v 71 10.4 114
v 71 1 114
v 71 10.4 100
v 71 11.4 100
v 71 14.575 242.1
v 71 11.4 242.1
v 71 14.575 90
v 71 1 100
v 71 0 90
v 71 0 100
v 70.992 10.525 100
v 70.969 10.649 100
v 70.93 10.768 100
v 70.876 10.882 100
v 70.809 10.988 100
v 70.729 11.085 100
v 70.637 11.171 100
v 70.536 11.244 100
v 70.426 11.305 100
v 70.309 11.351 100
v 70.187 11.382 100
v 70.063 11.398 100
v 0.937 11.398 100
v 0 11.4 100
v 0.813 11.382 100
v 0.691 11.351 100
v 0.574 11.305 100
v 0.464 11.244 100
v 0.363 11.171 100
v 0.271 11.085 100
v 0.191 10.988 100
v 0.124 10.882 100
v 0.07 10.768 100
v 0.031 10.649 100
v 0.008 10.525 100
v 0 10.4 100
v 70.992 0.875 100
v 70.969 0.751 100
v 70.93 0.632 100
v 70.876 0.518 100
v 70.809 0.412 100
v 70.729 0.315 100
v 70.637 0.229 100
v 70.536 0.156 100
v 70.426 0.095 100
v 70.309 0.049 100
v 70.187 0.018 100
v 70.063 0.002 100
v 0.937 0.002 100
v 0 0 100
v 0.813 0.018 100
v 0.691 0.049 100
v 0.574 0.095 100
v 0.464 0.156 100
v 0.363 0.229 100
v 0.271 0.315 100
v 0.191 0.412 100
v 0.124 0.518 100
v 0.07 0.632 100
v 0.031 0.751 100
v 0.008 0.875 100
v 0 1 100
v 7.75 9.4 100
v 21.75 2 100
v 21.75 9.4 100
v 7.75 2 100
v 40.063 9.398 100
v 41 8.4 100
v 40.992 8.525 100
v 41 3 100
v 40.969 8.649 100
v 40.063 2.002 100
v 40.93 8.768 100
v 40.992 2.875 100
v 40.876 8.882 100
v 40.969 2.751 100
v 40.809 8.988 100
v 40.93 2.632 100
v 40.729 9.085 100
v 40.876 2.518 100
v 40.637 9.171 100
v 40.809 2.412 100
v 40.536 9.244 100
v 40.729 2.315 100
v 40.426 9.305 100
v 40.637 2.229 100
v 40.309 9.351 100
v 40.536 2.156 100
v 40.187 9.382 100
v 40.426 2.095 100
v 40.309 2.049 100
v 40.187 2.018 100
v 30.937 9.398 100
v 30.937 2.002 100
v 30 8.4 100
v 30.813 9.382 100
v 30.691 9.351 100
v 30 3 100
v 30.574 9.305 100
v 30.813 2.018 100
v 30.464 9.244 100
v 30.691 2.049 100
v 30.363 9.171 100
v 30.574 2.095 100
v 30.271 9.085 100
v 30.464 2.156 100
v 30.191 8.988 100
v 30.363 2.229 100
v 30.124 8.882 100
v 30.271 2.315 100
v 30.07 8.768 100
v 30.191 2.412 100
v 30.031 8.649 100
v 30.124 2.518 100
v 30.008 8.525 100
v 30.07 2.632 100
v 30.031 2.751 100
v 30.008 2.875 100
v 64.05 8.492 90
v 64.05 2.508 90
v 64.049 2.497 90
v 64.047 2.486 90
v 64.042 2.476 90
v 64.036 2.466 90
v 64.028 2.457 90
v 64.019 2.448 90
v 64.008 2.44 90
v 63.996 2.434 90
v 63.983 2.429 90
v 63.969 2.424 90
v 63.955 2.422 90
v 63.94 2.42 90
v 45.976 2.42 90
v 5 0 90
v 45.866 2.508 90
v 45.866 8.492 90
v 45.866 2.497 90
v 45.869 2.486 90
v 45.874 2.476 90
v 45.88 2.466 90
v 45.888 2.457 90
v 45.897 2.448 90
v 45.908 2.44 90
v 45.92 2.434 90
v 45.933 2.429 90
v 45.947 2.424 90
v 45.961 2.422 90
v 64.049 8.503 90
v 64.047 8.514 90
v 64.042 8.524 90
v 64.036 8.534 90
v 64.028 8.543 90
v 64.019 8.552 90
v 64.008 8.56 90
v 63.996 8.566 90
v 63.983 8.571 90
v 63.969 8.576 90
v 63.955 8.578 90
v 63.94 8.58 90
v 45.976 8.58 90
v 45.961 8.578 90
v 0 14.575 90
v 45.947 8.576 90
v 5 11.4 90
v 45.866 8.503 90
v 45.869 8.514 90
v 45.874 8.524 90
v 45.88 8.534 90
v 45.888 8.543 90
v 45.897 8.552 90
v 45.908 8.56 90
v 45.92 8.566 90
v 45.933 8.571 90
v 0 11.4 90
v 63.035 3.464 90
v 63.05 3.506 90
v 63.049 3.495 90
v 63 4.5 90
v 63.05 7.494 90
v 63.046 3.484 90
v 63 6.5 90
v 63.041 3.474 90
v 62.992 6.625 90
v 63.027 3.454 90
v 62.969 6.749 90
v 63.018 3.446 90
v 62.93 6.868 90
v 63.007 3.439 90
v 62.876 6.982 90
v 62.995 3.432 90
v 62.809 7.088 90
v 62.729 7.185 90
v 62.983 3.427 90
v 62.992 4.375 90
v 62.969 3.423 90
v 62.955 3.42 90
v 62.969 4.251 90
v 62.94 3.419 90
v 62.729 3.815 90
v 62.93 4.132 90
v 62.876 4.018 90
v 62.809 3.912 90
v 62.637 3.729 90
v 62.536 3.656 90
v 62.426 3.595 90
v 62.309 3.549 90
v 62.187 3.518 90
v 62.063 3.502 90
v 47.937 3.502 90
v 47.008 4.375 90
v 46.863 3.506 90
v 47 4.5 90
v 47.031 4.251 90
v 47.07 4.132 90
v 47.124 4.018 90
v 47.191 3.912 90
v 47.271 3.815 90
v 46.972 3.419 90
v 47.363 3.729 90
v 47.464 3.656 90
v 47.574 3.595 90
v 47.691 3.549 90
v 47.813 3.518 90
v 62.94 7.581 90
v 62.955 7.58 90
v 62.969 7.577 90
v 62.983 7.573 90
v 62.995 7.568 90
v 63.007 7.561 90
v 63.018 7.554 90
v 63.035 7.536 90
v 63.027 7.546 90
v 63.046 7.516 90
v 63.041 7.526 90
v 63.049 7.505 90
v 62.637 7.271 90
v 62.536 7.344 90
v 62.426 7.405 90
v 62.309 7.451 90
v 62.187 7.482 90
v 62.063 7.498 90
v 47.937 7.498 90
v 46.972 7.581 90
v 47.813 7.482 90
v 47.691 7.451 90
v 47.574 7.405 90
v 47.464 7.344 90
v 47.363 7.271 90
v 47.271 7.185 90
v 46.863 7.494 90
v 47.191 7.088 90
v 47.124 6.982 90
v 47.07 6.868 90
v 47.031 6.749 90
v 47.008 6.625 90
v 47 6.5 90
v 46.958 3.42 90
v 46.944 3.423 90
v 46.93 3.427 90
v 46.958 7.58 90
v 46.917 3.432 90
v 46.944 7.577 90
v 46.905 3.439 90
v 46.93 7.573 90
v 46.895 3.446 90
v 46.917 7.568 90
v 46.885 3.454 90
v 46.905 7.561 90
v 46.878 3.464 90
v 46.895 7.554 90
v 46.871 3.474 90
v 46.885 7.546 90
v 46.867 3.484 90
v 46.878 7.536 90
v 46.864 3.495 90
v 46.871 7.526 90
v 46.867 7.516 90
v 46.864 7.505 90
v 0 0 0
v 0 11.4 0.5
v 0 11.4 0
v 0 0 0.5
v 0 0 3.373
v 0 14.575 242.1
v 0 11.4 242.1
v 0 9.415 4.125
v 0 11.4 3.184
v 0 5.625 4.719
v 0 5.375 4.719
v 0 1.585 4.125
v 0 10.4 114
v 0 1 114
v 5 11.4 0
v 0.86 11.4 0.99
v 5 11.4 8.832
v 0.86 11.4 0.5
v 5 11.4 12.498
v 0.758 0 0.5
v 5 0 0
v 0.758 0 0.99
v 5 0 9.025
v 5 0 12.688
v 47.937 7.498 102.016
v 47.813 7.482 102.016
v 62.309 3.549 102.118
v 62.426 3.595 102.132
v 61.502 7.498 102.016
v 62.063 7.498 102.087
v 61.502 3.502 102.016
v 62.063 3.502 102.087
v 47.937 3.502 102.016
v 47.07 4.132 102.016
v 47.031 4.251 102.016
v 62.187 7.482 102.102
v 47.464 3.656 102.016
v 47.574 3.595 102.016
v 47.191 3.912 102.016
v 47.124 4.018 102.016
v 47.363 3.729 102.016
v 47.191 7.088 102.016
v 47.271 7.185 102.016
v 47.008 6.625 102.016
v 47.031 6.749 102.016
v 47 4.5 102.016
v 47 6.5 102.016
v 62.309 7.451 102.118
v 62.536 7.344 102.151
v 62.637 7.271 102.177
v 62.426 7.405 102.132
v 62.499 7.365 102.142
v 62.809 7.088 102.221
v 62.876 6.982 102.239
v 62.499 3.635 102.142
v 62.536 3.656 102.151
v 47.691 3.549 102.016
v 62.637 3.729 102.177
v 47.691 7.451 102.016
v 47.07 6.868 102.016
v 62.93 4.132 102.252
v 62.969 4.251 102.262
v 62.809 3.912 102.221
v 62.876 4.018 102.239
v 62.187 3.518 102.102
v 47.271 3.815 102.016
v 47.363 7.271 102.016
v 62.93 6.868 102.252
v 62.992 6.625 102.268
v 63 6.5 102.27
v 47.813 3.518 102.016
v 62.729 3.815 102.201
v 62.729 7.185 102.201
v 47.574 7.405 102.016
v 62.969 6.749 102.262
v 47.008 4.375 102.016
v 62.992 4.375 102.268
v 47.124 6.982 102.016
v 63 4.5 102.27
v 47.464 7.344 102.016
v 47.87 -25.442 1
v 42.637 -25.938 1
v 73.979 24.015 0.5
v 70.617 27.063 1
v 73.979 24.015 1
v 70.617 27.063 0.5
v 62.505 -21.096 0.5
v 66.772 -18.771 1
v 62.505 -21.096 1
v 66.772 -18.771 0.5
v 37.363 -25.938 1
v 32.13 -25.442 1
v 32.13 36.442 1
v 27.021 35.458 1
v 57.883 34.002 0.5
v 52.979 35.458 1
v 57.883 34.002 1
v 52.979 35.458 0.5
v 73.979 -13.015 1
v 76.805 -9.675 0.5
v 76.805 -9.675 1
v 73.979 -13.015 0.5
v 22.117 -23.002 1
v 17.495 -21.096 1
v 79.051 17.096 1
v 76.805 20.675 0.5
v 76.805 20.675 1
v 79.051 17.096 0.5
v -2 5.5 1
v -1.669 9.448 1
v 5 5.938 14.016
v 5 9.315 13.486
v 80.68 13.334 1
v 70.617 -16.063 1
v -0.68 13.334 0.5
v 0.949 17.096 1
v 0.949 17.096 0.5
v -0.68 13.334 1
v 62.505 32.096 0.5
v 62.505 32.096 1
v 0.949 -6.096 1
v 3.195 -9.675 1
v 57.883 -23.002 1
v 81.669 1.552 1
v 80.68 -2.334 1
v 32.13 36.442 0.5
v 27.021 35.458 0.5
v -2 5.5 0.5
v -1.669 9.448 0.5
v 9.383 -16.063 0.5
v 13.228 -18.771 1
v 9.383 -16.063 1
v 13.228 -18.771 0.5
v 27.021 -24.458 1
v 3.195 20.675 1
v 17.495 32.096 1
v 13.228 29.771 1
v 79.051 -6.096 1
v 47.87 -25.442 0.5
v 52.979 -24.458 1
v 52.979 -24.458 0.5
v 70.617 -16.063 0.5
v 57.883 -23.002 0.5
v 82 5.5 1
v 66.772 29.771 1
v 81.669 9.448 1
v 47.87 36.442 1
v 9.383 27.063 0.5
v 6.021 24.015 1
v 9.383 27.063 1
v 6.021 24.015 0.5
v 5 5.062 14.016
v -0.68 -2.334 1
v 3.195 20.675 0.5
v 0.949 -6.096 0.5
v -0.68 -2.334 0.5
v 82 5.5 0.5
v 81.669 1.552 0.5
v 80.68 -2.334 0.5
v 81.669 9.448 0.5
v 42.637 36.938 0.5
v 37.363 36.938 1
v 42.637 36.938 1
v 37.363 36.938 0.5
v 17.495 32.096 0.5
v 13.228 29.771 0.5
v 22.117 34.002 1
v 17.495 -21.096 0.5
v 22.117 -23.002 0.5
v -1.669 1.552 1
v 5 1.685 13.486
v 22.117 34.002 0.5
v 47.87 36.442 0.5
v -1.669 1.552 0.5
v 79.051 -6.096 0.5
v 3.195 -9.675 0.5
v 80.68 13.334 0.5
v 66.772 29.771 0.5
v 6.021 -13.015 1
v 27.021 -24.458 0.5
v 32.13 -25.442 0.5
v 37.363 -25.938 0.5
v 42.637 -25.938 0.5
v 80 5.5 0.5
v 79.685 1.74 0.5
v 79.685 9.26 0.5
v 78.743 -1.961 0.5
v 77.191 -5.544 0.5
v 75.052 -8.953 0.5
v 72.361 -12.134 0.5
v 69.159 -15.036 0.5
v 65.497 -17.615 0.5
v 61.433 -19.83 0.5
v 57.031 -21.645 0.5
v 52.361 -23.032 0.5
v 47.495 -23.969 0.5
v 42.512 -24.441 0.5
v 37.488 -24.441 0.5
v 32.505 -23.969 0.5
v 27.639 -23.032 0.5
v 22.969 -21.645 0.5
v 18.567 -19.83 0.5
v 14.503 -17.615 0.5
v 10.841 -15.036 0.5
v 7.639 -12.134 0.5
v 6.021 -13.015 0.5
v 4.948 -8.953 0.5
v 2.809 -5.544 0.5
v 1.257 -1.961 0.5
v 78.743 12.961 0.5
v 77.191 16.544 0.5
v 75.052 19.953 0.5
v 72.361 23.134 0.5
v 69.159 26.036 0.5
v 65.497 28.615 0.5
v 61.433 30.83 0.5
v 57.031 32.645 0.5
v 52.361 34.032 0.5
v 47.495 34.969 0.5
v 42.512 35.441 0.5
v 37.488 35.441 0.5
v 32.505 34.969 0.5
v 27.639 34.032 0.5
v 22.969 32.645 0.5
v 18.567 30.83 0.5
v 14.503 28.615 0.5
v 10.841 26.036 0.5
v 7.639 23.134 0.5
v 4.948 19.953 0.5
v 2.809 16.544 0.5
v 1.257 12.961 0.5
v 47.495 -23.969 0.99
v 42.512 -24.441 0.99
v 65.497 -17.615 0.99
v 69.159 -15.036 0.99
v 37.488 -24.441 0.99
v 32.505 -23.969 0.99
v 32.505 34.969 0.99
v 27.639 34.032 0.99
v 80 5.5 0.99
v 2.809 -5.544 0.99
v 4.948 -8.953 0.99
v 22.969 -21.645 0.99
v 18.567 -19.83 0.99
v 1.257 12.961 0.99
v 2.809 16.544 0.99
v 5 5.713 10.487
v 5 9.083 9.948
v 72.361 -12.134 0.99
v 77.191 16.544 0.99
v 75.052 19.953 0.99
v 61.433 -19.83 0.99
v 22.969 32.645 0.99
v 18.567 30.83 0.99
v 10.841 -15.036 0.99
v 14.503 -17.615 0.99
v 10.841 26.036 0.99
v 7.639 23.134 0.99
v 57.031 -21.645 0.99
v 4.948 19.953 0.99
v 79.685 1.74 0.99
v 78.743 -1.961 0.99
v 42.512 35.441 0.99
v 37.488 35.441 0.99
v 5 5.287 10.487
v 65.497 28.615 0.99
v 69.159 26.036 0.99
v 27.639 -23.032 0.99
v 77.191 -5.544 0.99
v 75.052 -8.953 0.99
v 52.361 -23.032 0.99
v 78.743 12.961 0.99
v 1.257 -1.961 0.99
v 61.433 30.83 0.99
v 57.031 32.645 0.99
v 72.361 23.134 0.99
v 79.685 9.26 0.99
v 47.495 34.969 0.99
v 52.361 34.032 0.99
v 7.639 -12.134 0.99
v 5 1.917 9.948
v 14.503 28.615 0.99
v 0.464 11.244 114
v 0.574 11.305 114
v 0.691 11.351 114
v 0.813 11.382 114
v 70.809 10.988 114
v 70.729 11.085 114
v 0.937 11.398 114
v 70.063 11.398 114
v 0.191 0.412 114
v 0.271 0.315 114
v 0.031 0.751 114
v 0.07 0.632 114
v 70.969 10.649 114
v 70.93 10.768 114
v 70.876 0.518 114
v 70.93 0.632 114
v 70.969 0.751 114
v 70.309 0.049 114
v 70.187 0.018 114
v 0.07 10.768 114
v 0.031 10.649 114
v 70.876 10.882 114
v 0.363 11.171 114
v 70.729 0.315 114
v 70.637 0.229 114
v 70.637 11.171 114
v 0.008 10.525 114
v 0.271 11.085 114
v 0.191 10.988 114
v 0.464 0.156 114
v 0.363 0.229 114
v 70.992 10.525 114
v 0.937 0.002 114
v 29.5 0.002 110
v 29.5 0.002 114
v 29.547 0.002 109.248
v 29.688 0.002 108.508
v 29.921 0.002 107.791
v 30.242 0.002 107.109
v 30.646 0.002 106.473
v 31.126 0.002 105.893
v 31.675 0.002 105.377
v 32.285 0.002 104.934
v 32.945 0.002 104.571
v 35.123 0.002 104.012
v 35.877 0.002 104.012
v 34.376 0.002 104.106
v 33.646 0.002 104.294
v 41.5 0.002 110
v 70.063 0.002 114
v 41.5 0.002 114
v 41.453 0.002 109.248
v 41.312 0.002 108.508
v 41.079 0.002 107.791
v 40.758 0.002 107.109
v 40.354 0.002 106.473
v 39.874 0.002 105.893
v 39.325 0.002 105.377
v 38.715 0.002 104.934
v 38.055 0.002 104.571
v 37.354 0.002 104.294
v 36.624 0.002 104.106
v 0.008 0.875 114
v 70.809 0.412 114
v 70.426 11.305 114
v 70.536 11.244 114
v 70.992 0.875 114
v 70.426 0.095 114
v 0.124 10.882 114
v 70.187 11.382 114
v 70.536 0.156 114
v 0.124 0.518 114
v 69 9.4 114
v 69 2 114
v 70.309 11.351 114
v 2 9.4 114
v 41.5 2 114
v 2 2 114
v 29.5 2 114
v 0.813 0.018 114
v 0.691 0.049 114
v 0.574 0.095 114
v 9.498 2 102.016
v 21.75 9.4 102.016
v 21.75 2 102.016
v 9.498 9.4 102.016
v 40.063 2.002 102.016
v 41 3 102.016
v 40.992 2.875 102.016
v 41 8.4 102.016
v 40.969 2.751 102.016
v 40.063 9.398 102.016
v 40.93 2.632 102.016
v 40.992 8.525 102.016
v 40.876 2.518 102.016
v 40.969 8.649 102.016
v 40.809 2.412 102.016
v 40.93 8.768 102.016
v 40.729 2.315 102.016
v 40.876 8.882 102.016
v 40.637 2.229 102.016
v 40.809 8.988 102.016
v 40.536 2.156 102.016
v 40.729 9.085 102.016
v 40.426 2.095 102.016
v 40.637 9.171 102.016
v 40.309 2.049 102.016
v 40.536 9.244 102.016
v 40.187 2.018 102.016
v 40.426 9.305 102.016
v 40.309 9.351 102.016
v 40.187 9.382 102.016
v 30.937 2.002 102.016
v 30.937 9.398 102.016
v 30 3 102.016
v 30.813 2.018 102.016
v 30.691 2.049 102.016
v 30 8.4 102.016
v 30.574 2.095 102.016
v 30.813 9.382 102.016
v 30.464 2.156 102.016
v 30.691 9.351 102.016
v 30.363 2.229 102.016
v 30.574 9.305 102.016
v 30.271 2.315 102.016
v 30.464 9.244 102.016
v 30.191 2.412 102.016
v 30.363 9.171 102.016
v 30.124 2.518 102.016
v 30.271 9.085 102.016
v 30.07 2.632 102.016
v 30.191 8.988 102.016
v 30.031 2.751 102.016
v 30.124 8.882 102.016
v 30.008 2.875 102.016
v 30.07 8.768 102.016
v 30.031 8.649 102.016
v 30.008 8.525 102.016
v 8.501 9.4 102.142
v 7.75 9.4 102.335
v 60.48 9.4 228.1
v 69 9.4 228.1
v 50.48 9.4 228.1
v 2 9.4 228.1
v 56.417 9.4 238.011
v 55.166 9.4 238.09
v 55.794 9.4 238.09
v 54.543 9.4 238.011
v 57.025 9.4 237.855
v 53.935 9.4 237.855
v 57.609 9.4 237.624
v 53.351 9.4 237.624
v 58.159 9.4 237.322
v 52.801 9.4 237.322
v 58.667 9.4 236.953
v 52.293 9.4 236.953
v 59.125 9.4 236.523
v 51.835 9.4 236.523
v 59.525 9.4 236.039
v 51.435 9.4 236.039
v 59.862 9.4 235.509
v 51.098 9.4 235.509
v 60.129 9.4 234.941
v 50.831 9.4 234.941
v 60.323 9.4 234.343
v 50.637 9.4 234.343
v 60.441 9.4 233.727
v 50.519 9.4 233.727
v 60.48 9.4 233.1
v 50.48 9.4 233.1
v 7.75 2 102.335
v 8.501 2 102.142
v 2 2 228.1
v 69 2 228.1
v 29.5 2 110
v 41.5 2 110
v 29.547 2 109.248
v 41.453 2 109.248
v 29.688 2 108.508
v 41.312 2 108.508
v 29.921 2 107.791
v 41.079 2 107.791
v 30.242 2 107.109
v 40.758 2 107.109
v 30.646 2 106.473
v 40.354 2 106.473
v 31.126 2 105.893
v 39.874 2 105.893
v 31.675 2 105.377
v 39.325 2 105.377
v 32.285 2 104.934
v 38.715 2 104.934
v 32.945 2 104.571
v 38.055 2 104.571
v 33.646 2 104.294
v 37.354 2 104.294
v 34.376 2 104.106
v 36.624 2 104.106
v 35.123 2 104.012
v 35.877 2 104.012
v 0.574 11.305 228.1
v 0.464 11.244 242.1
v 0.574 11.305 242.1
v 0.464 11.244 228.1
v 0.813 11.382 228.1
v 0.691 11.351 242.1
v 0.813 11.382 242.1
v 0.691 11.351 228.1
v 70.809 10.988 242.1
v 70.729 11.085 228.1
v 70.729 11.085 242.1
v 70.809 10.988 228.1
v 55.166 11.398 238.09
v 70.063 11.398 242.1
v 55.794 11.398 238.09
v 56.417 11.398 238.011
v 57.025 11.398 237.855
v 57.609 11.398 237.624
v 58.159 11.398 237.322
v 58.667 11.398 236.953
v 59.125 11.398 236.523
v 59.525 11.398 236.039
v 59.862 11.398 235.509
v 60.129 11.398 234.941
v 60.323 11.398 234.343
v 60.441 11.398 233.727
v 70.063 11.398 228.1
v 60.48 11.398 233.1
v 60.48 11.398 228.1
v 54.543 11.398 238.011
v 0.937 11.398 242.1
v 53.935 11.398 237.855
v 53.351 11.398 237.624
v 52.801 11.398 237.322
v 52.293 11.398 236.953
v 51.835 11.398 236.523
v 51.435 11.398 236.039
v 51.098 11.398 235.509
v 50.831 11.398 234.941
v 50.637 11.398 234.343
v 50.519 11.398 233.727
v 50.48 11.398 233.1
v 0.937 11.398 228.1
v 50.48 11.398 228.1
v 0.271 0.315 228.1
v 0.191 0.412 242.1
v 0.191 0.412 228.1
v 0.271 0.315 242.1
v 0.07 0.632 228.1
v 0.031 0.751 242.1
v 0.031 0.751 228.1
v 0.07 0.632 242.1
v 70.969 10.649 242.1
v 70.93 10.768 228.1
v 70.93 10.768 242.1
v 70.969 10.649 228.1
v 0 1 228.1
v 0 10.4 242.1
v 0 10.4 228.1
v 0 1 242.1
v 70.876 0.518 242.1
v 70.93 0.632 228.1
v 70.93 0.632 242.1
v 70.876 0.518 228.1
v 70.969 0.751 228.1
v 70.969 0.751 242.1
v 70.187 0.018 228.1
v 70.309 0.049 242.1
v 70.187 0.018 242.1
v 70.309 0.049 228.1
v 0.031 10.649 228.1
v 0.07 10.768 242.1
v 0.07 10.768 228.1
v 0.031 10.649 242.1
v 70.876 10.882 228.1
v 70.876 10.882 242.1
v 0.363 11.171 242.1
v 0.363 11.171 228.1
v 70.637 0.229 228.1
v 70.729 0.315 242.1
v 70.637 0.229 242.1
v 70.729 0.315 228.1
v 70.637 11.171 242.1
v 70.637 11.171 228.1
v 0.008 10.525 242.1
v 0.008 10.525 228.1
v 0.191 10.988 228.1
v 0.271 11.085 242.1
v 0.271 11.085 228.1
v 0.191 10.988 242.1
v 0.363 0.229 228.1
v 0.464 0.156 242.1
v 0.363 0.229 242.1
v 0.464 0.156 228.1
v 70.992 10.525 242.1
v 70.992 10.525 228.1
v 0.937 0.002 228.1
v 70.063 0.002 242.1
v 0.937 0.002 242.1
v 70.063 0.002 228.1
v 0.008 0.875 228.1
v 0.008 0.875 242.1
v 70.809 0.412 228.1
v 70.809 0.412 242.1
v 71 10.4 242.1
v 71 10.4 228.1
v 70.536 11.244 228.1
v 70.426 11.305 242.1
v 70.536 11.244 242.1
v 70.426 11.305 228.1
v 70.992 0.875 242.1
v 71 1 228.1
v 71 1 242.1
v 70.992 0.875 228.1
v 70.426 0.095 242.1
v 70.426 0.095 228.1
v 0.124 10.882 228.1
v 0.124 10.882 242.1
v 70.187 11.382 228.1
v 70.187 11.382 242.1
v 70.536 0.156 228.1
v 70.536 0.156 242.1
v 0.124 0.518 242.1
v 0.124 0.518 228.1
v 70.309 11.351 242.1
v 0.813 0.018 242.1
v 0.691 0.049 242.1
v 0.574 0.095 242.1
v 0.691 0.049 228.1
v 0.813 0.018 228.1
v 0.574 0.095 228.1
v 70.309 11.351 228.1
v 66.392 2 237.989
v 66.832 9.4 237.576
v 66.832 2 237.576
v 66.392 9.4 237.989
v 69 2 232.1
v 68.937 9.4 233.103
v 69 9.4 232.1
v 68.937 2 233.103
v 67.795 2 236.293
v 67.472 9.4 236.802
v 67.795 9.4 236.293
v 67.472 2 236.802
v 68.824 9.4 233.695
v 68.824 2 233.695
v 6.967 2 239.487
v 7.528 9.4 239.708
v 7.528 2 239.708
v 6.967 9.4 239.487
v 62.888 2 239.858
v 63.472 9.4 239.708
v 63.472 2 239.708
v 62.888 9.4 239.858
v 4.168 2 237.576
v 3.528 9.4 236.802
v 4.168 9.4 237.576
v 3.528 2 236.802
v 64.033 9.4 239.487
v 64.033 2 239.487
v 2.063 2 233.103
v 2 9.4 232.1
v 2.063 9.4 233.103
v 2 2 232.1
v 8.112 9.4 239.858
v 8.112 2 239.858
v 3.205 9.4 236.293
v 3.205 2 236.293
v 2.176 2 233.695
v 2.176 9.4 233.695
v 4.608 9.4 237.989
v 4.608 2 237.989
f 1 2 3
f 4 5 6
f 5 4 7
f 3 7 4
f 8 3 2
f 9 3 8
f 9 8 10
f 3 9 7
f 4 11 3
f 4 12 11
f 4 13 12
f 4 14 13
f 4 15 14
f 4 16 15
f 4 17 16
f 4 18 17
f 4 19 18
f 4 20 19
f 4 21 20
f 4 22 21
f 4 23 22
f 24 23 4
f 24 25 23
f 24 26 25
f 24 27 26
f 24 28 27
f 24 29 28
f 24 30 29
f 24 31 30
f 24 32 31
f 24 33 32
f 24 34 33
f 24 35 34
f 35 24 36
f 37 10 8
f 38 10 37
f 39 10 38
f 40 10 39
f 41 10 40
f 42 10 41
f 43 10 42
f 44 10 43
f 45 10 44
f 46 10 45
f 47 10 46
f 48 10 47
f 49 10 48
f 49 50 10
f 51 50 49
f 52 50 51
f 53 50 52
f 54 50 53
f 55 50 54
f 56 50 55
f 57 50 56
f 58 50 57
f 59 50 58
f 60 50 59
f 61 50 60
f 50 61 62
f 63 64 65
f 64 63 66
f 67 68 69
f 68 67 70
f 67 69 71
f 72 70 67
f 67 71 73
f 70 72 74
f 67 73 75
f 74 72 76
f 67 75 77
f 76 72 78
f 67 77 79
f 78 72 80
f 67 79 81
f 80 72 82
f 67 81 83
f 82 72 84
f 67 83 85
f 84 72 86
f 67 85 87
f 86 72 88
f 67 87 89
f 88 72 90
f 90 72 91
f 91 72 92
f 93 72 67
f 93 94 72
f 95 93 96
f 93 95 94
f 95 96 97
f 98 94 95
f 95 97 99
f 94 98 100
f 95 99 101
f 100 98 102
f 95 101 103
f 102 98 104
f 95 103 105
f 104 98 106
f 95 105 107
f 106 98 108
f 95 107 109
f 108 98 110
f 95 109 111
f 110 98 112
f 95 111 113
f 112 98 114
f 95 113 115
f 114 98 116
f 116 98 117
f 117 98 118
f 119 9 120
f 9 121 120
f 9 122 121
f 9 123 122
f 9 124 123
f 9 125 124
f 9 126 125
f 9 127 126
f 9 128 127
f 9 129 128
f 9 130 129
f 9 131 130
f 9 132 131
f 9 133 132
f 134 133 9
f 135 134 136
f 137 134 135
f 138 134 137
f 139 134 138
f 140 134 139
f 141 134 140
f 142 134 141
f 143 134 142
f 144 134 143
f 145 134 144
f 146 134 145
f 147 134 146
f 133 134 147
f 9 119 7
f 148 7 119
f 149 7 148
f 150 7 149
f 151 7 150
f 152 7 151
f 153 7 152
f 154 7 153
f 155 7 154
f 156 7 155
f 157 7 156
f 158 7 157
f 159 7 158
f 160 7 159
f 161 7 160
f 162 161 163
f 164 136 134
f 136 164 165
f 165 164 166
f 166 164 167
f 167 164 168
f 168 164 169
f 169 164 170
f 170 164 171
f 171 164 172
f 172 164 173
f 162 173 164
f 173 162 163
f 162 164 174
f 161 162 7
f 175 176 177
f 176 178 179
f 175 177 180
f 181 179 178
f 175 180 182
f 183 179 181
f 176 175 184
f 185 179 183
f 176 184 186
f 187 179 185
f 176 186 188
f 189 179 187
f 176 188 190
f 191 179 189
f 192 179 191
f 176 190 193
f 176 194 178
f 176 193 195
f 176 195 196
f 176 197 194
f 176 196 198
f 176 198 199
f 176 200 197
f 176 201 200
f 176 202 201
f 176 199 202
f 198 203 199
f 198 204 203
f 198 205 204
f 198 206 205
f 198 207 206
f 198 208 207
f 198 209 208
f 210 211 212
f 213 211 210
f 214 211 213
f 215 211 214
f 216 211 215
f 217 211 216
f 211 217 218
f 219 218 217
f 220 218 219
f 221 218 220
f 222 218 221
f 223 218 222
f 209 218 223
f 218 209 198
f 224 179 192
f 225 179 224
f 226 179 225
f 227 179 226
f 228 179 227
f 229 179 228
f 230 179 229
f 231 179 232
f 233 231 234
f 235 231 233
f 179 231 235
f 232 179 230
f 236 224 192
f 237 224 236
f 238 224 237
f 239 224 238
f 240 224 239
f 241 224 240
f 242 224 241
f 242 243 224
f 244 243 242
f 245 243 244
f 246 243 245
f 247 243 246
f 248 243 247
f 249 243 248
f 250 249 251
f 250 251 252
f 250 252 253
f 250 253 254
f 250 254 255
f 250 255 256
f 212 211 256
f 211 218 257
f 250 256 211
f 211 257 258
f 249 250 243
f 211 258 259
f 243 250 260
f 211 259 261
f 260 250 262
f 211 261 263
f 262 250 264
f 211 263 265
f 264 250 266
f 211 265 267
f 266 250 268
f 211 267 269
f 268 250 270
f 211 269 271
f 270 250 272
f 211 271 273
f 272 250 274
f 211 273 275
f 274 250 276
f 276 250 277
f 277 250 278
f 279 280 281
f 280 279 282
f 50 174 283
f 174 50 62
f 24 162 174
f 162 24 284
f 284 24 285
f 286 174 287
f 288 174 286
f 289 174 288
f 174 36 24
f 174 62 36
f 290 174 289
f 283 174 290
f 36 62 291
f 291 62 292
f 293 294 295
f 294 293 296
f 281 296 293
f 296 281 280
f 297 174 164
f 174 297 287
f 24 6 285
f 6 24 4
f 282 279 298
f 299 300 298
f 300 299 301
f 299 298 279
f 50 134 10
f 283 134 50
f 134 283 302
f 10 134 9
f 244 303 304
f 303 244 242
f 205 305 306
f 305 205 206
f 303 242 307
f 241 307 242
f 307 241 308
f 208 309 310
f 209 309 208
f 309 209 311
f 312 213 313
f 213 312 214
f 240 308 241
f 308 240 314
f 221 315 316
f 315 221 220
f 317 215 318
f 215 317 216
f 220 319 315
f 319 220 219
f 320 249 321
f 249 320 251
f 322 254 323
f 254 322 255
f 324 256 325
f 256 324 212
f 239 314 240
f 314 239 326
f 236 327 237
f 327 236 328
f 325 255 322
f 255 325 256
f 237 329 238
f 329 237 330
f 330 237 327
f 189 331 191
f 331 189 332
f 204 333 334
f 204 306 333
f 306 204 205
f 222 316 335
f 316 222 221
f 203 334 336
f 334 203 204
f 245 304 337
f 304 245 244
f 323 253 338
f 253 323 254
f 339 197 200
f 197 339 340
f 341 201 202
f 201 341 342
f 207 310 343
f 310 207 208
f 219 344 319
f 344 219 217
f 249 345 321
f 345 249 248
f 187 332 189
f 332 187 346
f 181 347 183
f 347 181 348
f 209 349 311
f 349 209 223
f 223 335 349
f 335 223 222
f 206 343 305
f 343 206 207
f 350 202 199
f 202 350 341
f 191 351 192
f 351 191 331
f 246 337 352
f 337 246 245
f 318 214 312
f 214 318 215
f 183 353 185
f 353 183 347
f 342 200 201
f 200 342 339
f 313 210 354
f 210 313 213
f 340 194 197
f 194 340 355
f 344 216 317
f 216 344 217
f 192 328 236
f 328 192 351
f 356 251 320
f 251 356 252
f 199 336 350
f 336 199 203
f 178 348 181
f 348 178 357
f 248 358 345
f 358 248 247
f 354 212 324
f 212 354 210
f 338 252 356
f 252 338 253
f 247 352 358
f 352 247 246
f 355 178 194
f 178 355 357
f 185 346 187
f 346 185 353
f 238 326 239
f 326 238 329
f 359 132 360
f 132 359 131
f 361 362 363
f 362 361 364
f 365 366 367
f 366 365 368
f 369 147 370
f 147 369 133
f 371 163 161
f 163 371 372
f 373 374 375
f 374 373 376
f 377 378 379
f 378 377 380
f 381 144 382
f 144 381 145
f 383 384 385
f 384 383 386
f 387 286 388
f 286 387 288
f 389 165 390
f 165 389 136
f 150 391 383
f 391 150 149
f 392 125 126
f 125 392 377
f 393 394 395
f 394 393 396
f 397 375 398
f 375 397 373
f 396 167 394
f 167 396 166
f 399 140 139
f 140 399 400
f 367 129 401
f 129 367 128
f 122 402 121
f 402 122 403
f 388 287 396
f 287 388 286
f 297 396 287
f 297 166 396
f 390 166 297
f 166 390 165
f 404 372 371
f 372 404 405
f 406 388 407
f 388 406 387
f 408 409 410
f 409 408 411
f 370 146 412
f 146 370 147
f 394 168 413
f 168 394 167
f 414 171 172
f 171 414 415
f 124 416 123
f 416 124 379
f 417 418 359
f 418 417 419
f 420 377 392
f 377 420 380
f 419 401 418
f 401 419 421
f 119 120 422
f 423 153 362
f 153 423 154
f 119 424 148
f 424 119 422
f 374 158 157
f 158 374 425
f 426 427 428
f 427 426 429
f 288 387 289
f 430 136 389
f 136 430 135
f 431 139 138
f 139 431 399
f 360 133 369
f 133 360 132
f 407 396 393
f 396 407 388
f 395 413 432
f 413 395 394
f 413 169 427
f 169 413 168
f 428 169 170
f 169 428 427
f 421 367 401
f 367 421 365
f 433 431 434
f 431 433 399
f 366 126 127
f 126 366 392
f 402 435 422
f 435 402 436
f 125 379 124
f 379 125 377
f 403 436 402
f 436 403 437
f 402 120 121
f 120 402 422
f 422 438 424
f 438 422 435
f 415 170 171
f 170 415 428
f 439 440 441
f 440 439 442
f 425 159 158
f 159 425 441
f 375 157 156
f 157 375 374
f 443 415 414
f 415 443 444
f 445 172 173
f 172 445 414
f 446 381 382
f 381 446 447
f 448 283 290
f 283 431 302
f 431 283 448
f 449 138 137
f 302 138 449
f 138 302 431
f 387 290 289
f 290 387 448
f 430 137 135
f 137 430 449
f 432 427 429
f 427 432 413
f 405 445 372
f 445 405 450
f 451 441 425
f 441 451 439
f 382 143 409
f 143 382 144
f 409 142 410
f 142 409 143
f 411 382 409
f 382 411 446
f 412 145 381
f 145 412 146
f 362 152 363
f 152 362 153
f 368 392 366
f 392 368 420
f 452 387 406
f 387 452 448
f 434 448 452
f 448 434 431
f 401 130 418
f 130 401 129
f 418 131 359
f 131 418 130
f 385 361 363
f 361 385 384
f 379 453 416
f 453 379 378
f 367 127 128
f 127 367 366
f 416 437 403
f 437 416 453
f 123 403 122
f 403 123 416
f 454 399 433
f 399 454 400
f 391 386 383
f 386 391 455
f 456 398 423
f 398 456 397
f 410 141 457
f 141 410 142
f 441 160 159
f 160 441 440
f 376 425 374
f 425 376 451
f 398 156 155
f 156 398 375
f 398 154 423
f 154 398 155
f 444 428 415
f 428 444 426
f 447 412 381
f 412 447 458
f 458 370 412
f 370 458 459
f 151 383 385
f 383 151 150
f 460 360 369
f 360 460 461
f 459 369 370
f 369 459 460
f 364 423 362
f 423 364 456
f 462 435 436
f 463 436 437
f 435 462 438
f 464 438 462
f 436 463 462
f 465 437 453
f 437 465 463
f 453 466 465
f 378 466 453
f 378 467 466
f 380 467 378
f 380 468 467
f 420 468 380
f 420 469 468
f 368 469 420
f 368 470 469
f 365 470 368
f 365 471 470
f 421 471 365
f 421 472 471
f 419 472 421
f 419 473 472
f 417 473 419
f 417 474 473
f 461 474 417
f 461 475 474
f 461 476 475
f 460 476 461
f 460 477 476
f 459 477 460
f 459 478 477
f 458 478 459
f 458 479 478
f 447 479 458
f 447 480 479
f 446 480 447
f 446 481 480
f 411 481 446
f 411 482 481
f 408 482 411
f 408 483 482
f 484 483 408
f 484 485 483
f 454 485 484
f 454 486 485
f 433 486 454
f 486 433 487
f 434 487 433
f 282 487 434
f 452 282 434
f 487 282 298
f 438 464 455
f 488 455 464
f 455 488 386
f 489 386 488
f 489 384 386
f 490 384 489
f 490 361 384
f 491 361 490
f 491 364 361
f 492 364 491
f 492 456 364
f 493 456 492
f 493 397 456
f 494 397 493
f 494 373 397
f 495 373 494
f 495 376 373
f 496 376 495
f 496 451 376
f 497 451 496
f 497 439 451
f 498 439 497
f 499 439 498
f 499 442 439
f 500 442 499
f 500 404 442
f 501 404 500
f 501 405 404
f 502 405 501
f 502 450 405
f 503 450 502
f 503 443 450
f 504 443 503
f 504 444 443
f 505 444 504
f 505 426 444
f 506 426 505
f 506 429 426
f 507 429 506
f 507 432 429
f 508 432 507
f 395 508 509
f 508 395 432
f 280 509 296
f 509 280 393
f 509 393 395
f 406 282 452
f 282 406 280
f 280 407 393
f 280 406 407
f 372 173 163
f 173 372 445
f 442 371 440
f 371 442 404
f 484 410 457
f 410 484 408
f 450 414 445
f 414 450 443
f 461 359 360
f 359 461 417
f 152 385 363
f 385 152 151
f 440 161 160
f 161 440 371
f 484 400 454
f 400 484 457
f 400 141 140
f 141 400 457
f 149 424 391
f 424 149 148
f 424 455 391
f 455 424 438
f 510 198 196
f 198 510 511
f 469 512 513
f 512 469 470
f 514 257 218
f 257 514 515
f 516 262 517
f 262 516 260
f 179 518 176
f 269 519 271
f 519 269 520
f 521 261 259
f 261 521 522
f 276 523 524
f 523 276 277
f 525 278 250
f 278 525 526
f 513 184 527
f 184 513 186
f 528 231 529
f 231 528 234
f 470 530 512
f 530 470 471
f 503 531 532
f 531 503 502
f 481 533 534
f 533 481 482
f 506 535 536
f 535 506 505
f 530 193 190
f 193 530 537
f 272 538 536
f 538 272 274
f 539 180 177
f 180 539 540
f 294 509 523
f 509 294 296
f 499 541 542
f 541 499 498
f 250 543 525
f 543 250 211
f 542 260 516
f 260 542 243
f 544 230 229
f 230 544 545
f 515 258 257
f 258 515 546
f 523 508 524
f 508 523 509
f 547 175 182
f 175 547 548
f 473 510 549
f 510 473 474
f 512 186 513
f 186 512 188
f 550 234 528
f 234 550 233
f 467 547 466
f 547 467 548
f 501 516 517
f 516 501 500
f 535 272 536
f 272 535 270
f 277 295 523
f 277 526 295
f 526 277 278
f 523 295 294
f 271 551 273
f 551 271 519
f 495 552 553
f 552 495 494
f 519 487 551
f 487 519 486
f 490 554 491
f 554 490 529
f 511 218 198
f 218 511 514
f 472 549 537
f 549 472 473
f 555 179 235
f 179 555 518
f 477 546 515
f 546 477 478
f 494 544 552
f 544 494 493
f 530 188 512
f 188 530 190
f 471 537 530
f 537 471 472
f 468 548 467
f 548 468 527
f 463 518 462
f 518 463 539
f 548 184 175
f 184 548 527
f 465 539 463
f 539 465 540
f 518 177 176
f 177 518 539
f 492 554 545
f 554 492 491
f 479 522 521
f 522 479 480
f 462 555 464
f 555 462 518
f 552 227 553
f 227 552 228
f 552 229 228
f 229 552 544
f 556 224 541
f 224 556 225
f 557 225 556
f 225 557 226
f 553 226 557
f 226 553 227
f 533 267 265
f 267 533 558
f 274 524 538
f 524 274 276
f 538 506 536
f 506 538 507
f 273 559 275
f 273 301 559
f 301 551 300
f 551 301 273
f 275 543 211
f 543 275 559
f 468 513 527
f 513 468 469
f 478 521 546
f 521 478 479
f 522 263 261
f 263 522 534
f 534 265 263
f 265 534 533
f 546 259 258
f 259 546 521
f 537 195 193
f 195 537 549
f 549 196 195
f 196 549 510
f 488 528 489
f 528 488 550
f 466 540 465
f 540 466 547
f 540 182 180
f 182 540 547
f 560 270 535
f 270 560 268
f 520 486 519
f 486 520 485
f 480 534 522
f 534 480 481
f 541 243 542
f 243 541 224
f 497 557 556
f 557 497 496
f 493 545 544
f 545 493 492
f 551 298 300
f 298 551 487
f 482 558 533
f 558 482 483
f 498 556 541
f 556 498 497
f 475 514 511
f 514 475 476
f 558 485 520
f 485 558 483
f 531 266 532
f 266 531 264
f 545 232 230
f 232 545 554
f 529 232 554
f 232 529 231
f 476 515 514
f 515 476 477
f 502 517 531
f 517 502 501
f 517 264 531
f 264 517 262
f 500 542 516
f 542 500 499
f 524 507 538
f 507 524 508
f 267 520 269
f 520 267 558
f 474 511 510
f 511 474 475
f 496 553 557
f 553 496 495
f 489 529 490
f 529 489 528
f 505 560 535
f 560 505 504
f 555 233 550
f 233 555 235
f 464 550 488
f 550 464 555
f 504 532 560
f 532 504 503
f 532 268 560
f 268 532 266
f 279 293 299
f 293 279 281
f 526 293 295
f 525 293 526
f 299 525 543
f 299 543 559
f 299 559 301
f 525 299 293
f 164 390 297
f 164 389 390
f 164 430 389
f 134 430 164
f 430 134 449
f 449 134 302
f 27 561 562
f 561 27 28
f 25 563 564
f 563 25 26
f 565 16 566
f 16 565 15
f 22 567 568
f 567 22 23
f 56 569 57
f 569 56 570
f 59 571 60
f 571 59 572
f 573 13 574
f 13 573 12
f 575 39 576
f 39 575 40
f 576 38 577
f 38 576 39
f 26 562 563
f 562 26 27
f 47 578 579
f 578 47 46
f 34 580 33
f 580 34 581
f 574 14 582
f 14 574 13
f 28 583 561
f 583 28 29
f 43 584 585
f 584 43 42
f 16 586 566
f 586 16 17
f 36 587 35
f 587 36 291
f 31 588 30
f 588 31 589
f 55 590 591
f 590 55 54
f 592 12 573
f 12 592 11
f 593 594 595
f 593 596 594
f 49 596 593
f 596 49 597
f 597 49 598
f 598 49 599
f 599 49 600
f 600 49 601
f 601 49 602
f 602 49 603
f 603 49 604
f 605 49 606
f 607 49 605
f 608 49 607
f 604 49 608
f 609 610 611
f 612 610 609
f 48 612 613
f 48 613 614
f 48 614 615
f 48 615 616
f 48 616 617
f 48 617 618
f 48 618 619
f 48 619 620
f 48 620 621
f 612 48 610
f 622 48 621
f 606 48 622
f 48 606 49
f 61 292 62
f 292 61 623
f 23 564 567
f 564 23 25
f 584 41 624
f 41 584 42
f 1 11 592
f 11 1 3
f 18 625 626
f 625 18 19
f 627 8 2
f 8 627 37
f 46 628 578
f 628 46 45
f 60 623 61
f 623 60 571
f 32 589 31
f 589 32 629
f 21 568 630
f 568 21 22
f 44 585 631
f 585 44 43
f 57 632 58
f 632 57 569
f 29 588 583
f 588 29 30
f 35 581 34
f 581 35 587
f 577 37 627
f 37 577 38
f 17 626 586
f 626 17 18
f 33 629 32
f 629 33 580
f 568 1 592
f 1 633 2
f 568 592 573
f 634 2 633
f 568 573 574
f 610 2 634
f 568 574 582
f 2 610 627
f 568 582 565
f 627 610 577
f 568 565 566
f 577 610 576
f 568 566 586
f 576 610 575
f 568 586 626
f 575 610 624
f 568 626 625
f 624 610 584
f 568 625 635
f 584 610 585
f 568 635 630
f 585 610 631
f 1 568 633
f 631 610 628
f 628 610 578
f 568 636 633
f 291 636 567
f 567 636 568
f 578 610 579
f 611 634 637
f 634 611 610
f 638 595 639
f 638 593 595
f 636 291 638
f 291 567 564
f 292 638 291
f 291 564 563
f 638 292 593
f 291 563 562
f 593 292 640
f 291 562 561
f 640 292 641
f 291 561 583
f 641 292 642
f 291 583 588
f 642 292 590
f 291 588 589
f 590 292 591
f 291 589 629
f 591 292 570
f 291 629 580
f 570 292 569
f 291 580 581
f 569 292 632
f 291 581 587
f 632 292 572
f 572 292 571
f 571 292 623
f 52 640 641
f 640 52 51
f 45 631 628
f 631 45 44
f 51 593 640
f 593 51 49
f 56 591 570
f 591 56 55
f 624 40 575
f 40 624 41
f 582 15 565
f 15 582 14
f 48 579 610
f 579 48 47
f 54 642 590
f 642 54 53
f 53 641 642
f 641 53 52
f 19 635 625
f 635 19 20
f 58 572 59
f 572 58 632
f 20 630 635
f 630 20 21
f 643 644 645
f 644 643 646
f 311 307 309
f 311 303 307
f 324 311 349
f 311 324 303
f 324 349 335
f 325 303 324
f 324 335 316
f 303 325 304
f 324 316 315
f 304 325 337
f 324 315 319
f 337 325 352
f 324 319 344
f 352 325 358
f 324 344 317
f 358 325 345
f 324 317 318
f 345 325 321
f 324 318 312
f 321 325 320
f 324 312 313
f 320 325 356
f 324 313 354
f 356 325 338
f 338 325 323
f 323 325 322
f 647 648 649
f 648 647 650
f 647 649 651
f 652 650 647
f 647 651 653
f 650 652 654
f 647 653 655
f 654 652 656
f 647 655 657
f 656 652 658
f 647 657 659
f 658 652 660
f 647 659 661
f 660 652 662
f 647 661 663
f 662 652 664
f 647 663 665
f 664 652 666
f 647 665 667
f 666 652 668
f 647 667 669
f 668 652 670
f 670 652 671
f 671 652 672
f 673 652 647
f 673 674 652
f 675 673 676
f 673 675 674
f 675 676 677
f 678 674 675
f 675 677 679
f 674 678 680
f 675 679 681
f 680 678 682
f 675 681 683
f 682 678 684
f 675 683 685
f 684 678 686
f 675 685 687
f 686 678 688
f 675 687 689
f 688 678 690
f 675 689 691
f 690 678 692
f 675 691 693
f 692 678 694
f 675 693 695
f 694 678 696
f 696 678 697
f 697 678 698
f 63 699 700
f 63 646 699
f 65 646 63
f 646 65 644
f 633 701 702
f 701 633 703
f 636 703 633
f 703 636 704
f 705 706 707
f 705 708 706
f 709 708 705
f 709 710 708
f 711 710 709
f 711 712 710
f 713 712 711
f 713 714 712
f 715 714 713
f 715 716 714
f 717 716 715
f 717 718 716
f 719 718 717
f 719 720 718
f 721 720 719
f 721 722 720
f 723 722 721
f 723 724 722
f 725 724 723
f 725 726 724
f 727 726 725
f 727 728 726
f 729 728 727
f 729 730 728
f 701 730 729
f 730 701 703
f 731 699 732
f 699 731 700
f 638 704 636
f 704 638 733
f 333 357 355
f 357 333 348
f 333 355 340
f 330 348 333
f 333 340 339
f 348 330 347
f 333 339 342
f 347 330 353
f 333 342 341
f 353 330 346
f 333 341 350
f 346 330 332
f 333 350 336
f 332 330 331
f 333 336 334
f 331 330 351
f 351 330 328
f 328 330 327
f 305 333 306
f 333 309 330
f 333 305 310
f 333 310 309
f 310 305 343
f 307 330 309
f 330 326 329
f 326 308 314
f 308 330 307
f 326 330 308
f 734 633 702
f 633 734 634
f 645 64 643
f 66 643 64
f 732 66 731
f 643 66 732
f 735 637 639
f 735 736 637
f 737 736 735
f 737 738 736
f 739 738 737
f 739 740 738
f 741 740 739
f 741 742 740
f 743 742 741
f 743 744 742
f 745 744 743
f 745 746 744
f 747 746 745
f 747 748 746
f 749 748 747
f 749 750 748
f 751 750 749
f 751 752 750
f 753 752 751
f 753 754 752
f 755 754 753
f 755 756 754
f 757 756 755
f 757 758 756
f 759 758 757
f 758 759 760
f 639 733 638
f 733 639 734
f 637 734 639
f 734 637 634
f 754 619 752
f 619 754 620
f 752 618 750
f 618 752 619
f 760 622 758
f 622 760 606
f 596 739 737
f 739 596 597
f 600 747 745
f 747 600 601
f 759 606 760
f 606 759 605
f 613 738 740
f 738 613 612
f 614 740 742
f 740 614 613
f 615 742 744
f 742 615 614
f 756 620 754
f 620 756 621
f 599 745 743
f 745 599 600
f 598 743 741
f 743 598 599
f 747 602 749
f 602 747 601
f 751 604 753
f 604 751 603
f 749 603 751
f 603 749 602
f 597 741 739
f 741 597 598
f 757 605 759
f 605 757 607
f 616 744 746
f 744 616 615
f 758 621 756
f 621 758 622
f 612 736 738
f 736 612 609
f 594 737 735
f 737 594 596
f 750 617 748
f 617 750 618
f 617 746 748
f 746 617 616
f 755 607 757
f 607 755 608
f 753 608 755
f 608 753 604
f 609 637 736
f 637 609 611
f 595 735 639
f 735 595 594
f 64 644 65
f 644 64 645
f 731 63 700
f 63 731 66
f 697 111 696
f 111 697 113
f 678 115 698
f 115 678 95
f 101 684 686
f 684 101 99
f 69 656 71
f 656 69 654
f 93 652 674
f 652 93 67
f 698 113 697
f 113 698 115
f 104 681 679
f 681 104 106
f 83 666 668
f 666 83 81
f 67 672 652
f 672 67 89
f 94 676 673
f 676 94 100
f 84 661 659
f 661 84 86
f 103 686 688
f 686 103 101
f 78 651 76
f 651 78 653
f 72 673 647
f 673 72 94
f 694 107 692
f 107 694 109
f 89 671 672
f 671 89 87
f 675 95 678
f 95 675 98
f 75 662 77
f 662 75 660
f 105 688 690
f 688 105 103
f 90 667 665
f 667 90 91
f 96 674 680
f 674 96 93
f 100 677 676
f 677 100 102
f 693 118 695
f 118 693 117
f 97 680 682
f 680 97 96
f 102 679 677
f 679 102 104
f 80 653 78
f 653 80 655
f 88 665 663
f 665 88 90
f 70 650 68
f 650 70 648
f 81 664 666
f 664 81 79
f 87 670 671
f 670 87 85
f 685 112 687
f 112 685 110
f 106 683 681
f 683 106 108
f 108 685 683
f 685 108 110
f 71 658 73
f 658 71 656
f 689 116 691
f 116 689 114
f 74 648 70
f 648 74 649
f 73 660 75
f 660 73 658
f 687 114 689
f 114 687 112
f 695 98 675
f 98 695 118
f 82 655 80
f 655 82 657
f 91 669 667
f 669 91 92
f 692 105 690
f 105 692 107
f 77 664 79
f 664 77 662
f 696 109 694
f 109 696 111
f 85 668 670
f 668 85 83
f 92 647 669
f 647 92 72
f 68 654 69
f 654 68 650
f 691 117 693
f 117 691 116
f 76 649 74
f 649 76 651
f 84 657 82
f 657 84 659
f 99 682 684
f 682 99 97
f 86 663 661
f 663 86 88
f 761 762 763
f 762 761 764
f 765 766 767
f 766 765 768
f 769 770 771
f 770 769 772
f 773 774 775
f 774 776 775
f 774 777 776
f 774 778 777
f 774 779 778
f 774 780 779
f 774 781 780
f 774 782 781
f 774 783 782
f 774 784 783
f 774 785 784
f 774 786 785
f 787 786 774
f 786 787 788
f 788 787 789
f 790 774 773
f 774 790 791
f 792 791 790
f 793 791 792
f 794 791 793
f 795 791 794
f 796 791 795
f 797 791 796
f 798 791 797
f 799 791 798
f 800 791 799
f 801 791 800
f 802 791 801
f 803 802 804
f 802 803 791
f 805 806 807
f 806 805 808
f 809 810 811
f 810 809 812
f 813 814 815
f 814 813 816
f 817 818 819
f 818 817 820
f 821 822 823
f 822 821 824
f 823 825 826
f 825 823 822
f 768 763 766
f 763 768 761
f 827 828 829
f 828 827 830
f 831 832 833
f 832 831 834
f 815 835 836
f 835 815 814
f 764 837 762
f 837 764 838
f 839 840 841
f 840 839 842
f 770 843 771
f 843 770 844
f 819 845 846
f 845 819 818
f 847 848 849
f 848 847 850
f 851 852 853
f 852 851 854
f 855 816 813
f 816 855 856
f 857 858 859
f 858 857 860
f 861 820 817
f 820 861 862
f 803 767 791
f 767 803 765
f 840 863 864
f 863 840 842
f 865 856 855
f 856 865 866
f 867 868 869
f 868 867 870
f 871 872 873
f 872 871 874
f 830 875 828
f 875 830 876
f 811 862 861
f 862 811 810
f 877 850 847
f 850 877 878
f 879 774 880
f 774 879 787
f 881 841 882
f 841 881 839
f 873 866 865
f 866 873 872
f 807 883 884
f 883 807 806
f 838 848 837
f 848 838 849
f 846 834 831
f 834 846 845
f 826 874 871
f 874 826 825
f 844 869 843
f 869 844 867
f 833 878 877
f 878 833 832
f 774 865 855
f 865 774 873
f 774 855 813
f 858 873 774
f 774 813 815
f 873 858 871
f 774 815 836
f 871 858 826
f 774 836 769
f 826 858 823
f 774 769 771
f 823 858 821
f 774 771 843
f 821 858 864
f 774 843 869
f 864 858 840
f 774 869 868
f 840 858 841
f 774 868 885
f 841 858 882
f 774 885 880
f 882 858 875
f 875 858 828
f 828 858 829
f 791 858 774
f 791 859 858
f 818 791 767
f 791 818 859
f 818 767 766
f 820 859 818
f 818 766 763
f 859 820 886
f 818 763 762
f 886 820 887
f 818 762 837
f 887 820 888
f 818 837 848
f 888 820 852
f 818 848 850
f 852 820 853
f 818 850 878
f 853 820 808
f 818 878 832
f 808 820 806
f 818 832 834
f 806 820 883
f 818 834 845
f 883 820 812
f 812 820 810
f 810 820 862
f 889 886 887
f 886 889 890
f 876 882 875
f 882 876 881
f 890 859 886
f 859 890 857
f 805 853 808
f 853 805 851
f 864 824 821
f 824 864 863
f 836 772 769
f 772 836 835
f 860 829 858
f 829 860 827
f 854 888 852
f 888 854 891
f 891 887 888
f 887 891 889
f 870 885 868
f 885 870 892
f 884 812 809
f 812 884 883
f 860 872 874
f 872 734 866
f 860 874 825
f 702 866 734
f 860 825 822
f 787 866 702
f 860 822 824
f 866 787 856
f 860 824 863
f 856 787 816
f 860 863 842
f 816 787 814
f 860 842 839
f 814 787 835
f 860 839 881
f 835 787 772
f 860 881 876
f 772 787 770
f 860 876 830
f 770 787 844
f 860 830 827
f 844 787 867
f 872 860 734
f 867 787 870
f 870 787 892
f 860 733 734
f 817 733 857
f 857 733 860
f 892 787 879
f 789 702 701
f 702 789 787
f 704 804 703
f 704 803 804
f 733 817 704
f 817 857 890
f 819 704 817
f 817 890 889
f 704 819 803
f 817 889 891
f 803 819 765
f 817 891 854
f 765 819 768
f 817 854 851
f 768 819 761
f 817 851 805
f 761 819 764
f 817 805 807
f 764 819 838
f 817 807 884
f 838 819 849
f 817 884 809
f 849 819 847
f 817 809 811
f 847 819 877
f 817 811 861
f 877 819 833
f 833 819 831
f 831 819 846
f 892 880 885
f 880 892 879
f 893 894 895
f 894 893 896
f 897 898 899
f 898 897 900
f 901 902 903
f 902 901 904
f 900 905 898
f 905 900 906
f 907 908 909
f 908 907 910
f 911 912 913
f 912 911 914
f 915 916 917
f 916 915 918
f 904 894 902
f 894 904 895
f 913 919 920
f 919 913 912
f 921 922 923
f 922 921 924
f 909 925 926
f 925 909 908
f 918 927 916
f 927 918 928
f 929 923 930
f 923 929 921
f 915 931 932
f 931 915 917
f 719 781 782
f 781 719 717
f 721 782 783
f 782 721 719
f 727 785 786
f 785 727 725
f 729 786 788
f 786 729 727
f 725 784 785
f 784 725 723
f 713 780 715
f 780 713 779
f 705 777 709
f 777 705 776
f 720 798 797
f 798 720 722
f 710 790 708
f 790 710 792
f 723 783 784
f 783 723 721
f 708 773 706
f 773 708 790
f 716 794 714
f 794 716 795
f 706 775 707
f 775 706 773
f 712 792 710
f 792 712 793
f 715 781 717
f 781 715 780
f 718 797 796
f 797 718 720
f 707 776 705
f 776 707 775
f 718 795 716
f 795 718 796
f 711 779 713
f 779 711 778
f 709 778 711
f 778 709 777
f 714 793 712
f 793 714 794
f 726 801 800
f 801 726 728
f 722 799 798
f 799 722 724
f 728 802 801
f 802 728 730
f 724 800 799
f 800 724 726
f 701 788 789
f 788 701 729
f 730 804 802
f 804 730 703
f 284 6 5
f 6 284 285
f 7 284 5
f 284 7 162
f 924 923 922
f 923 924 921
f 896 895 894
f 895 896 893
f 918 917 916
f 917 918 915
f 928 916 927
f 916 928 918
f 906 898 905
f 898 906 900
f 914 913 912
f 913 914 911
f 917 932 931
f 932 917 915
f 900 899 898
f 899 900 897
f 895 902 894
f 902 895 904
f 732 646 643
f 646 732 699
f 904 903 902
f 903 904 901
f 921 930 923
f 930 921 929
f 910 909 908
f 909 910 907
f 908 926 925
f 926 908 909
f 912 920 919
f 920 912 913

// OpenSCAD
// file: ../lib/basics.scad
// ## `basics.scad`
// This library contains basic elements to construct mobile device augmentations.

// ### `roundedCube(dimension,edgeRadius)`
// A cube with rounded edges on the depth axis. This function is helpful for creating simple phone shapes.
// #### Where
// * `dimension=[width,depth,height]`: the size of the cube
// * `edgeRadius`: the radius of the rounded edges 
module roundedCube(dimension=[10,10,10],edgeRadius=1){
    translate([0,dimension[1],0])
		rotate([90,0,0])
			hull(){
        		translate([edgeRadius,edgeRadius,0])
					cylinder(r=edgeRadius,h=dimension[1]);
        		translate([dimension[0]-edgeRadius,edgeRadius,0])
					cylinder(r=edgeRadius,h=dimension[1]);
        		translate([edgeRadius,dimension[2]-edgeRadius,0])
					cylinder(r=edgeRadius,h=dimension[1]);
        		translate([dimension[0]-edgeRadius,dimension[2]-edgeRadius,0])
					cylinder(r=edgeRadius,h=dimension[1]);
    		}
}

// ### `bottomHolder(deviceWidth,deviceDepth,deviceEdgeRadius,deviceHeightInHolder,wallThickness,holderEdgeRadius)`
// A basic generic element to hold the bottom part of a device
// #### Where
// * `deviceWidth`: the width of the device to be held
// * `deviceDepth`: the depth of the device to be held
// * `deviceEdgeRadius`: the edge radius of the device to be held
// * `deviceHeightInHolder`: the height of the part of the holder covering the device
// * `wallThickness`: the holder's wall thickness
// * `holderEdgeRadius`: the holder's edge radius
module bottomHolder(deviceWidth=10,deviceDepth=10,deviceEdgeRadius=1,
deviceHeightInHolder=10,wallThickness=1,holderEdgeRadius=1){
	difference(){
		translate([0,deviceDepth+wallThickness*2,0])
			rotate([90,0,0])
				roundedCube([deviceWidth+wallThickness*2,deviceHeightInHolder+wallThickness,
				deviceDepth+wallThickness*2],holderEdgeRadius);
		translate([wallThickness,wallThickness,wallThickness])
			roundedCube([deviceWidth,deviceDepth,
			deviceHeightInHolder+deviceEdgeRadius],deviceEdgeRadius);
	}
}

// ### `topHolder(deviceWidth,deviceDepth,deviceEdgeRadius,deviceHeightInHolder,wallThickness,lipsWidth,holderEdgeRadius)`
// A basic generic element to hold the top part of a device
// #### Where
// * `deviceWidth`: the width of the device to be held
// * `deviceDepth`: the depth of the device to be held
// * `deviceEdgeRadius`: the edge radius of the device to be held
// * `deviceHeightInHolder`: the height of the part of the holder covering the device
// * `wallThickness`: the holder's wall thickness
// * `lipsWidth`: size of the lips holding the device
// * `holderEdgeRadius`: the holder's edge radius
module topHolder(deviceWidth=10,deviceDepth=10,deviceEdgeRadius=1,deviceHeightInHolder=10,
wallThickness=1,lipsWidth=2,holderEdgeRadius=1){
	difference(){
		translate([0,deviceDepth+wallThickness*2,0])rotate([90,0,0])
			roundedCube([deviceWidth+wallThickness*2,deviceHeightInHolder+wallThickness,
			deviceDepth+wallThickness*2],holderEdgeRadius);
		translate([wallThickness,wallThickness,-wallThickness*2])
			roundedCube([deviceWidth,deviceDepth,deviceHeightInHolder],deviceEdgeRadius);
		//translate([wallThickness+lipsWidth,-0.01,-wallThickness-lipsWidth-0.85]) // TODO: 0.85 wrong here: needs to be fixed
		//	roundedCube([deviceWidth-lipsWidth*2,wallThickness+0.02,deviceHeightInHolder],
	//		deviceEdgeRadius*((deviceWidth-lipsWidth*2)/deviceWidth));
	}
}

// ### `rectangleCircularHorn(rectangleWidth,rectangleHeight,circleRadius,hornLength,wallThickness,hornDeformationFactor,hornDerivation,endsHeight)`
// A horn with a square termination on one side and a circle termination on the other.
// #### Where
// * `rectangleWidth`: the width of the rectangular termination
// * `rectangleHeight`: the height of the rectangular termination
// * `circleRadius`: the radius of the circular termination
// * `hornLength`: the length of the horn
// * `wallThickness`: the thickness of the walls
// * `hornDeformationFactor`: controls the vertical flatness of the horn with (1=perfect circle, >1=flatened circle) 
// * `hornDerivation`: displace the position of the circular end relatively to the rectangular end on the horizontal axis
// * `endsHeight`: the height of the two ends
module rectangleCircularHorn(rectangleWidth=10,rectangleHeight=10,circleRadius=10,hornLength=10,wallThickness=1,
hornDeformationFactor=1,hornDerivation=0,endsHeight=0.5){
	difference(){
		hull(){
			cube([rectangleWidth+wallThickness,rectangleHeight+wallThickness,endsHeight],center=true);
			translate([hornDerivation,0,hornLength-endsHeight*2])
				scale([1,hornDeformationFactor,1])
					cylinder(r=circleRadius+wallThickness,h=endsHeight);
		}
		hull(){
			translate([0,0,-0.01])
				cube([rectangleWidth,rectangleHeight,endsHeight],center=true);
			translate([hornDerivation,0,hornLength-endsHeight*2+0.01])
				scale([1,hornDeformationFactor,1])
					cylinder(r=circleRadius,h=endsHeight);
		}
	}
}

// ### `halfSphere(radius)`
// A half sphere useful to create tops.
// #### Where
// * `radius`: the radius of the half sphere
module halfSphere(radius=10){
	difference(){
		translate([radius,radius,0])sphere(radius);
		translate([0,0,-radius*2])cube([radius*2,radius*2,radius*2]);
	}
}

// ### `halfCylinder(dimension=[10,10,10])`
// A half cylinder with controllable height.
// #### Where
// * `dimension=[width,depth,height]`: the size of the half cylinder
module halfCylinder(dimension=[10,10,10]){
	rotate([-90,0,0])scale([1,dimension[2]/dimension[0],1])difference(){
		translate([dimension[0]/2,0,0.01])cylinder(r=dimension[0]/2,h=dimension[1]);
		cube([dimension[0],dimension[0],dimension[1]+0.02]);
	}
}
// main file
include <../lib/iPhone6.scad>

$fn=50;

iPhone6_CaseWithLargePassiveAmp();
translate([iPhone6_Module_WallThickness,iPhone6_Module_WallThickness,iPhone6_Module_WallThickness+iPhone6_LargePassiveAmp_HornLength+iPhone6_LargePassiveAmp_BaseThickness])iPhone6();
